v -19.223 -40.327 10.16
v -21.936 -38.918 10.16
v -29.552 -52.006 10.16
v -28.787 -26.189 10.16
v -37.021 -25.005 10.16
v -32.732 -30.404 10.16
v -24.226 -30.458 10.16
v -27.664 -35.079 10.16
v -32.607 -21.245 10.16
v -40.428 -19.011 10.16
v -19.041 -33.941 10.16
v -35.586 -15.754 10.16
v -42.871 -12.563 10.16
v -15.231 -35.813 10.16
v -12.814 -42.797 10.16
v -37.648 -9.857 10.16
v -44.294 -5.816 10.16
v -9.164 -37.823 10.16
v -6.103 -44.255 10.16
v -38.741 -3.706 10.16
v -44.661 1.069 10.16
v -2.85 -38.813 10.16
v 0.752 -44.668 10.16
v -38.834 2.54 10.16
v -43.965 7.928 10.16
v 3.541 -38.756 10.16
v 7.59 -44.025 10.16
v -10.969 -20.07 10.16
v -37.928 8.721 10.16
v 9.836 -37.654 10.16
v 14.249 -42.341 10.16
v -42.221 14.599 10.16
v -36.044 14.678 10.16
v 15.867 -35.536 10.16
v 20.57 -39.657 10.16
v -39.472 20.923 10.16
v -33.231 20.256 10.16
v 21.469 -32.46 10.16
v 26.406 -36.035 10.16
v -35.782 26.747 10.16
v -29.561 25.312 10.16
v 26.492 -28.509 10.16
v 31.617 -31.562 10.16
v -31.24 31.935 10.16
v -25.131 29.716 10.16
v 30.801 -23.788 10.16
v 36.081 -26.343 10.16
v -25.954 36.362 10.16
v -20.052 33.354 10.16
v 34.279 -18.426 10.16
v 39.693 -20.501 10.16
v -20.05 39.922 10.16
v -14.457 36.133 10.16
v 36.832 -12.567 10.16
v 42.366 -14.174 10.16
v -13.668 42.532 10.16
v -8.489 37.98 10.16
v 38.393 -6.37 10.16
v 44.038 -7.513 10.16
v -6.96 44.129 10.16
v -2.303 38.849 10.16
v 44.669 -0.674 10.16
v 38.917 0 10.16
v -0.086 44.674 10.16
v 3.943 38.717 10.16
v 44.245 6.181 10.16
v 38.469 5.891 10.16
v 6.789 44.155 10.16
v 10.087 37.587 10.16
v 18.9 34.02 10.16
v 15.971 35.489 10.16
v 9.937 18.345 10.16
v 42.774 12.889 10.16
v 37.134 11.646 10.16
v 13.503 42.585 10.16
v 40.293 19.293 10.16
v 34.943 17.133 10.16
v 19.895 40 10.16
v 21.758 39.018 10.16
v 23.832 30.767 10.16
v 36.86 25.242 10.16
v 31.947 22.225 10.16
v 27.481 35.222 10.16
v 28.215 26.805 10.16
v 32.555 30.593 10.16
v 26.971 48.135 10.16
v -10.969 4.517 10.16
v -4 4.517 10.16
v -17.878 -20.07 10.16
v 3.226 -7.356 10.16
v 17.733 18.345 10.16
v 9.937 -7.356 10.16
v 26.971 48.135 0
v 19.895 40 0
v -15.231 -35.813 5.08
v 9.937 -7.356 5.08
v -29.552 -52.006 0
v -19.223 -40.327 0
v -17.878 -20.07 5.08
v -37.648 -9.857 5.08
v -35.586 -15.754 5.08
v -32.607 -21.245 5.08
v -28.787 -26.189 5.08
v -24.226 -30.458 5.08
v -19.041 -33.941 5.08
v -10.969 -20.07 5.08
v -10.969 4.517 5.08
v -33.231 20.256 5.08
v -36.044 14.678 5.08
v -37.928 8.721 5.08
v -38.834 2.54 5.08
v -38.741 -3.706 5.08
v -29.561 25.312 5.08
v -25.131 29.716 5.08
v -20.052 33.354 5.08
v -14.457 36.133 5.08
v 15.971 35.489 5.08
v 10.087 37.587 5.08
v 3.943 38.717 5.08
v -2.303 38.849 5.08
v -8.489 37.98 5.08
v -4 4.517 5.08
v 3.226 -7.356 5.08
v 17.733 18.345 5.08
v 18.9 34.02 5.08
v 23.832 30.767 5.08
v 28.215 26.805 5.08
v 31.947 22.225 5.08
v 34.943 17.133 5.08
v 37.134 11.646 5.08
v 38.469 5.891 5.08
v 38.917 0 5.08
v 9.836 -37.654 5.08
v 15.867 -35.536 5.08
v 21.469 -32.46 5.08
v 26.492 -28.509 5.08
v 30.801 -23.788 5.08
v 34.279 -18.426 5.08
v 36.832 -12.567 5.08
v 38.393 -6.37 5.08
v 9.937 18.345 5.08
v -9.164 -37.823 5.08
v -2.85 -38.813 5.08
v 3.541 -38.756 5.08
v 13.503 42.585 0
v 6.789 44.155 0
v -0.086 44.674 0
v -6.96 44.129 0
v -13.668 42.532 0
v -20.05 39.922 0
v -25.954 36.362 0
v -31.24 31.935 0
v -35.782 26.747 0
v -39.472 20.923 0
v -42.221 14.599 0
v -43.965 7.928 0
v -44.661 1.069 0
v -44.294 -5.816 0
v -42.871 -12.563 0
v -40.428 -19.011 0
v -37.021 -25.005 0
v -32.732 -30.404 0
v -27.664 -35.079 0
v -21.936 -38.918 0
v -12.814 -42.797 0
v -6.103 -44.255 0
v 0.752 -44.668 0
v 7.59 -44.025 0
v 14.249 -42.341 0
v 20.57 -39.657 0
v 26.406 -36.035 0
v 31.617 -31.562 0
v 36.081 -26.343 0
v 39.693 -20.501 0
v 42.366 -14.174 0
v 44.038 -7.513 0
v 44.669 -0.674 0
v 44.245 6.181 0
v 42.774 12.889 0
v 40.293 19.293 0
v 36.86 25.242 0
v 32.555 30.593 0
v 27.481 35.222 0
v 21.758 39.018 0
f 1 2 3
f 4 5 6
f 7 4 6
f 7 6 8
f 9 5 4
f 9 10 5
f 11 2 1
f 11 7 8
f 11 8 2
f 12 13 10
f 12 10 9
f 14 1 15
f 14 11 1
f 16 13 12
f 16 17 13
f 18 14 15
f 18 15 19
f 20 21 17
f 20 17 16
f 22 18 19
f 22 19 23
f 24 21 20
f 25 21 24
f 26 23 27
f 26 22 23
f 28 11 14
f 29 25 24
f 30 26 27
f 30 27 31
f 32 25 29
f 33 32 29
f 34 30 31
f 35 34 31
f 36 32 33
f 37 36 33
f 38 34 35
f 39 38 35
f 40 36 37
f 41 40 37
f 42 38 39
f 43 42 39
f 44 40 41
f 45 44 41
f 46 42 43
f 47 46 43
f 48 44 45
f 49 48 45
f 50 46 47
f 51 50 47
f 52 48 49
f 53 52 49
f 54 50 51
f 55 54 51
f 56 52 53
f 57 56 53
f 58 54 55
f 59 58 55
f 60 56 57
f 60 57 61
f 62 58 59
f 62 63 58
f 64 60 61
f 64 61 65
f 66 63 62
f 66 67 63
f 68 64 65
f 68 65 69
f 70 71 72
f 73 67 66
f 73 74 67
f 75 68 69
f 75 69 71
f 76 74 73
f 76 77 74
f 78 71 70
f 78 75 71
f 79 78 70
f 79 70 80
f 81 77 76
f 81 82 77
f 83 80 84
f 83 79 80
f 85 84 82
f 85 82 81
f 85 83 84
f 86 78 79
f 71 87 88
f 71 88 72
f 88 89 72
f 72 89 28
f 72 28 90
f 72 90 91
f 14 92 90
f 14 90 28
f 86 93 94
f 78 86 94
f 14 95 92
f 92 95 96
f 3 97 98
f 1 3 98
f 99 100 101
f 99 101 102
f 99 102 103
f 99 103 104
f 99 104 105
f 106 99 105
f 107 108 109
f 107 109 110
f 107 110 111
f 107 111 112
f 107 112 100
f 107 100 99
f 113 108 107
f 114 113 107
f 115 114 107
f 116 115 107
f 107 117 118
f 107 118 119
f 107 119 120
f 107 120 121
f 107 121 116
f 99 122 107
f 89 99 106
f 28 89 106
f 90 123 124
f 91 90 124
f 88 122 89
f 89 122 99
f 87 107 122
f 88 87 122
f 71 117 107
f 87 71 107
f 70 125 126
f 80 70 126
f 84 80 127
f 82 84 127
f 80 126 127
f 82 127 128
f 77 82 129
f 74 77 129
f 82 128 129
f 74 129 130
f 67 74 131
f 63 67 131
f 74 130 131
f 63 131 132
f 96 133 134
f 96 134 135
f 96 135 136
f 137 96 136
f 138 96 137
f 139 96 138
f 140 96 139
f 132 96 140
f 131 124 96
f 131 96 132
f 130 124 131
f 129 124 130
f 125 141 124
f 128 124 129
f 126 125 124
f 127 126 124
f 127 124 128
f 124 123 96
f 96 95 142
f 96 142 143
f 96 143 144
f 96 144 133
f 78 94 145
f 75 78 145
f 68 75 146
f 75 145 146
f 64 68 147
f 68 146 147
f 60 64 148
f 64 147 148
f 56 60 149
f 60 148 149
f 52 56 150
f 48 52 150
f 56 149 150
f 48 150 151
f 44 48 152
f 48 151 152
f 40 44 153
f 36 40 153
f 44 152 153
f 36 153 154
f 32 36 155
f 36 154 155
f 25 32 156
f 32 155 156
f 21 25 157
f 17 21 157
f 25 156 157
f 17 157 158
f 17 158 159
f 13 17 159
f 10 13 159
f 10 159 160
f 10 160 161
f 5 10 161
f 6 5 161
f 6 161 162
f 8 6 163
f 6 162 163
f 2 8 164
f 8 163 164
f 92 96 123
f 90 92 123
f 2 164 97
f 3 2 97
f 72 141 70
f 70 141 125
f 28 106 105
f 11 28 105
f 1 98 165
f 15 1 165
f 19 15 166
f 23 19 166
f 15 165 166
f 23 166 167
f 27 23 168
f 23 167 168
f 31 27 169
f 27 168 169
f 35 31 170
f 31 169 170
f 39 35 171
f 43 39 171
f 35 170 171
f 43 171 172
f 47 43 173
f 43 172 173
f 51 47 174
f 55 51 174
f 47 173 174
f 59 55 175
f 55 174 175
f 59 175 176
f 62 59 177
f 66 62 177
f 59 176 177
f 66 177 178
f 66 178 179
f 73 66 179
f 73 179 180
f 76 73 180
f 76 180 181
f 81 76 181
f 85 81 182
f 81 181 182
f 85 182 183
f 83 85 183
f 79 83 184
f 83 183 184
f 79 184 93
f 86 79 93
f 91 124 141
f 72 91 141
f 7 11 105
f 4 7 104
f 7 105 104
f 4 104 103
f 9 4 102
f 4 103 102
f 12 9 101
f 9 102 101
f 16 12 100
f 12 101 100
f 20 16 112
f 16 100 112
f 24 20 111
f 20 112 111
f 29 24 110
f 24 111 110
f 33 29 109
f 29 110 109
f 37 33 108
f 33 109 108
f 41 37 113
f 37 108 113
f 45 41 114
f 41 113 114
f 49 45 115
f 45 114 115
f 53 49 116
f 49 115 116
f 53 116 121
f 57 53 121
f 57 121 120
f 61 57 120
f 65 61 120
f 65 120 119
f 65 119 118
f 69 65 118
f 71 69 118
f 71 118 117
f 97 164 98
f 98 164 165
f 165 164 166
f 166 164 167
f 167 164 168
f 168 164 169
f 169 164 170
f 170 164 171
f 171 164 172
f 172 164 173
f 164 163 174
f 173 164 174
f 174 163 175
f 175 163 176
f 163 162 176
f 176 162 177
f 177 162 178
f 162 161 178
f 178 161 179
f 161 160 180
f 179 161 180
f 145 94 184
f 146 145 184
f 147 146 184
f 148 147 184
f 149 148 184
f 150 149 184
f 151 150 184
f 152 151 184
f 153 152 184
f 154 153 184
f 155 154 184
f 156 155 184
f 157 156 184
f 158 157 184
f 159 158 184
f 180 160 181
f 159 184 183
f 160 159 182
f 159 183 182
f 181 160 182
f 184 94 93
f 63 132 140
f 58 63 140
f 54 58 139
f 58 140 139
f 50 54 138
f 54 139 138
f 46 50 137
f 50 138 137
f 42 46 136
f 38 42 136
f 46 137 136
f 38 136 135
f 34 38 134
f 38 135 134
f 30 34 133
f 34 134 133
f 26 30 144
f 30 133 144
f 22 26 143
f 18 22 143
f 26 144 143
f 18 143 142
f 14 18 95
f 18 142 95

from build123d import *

# Parameters (mm, degrees)
F1_DEPTH = 10.16
F2_DEPTH = 5.08


with BuildPart() as f1:
    # F0 (on Top) → F1 (new body)
    with BuildSketch(Plane.XY):
        with BuildLine():
            ThreePointArc((19.8948644209, 39.9997688602), (20.8320918018, 39.5197556971), (21.7577454104, 39.0177863782))
            Line((21.7577454104, 39.0177863782), (26.9711147994, 48.1350496411))
            Line((26.9711147994, 48.1350496411), (19.8948644209, 39.9997688602))
        make_face()
        with BuildLine():
            Line((-29.5520797372, -52.0064979792), (-19.2228405766, -40.327032365))
            ThreePointArc((-19.2228405766, -40.327032365), (-20.5915769431, -39.6456062912), (-21.9361932063, -38.9177410292))
            Line((-21.9361932063, -38.9177410292), (-29.5520797372, -52.0064979792))
        make_face()
        with BuildLine():
            ThreePointArc((-19.2228405766, -40.327032365), (23.8434631573, -37.7793118501), (44.6742335043, 0))
            ThreePointArc((44.6742335043, 0), (38.5214079324, 22.624947958), (21.7577454104, 39.0177863782))
            Line((21.7577454104, 39.0177863782), (18.8999443356, 34.0199965021))
            ThreePointArc((18.8999443356, 34.0199965021), (33.5418077285, 19.7361392424), (38.9174518423, 0))
            ThreePointArc((38.9174518423, 0), (21.4688277759, -32.460090755), (-15.2308770921, -35.8132439315))
            Line((-15.2308770922, -35.8132439315), (-19.2228405766, -40.327032365))
        make_face()
        with BuildLine():
            Line((18.8999443356, 34.0199965021), (21.7577454104, 39.0177863782))
            ThreePointArc((21.7577454104, 39.0177863782), (20.8320918018, 39.5197556971), (19.8948644209, 39.9997688602))
            Line((19.8948644209, 39.9997688602), (15.971442641, 35.4891684583))
            ThreePointArc((15.971442641, 35.4891684583), (17.4511611069, 34.7854140972), (18.8999443356, 34.0199965021))
        make_face()
        with BuildLine():
            ThreePointArc((-21.9361932063, -38.9177410292), (-20.5915769431, -39.6456062912), (-19.2228405766, -40.327032365))
            Line((-19.2228405766, -40.327032365), (-15.2308770922, -35.8132439315))
            ThreePointArc((-15.2308770921, -35.8132439315), (-17.1613070553, -34.9293228971), (-19.0406590573, -33.9414401662))
            Line((-19.0406590573, -33.9414401662), (-21.9361932063, -38.9177410292))
        make_face()
        with BuildLine():
            Line((9.9367275834, 18.344911789), (18.8999443356, 34.0199965021))
            ThreePointArc((18.8999443356, 34.0199965021), (17.4511611069, 34.7854140972), (15.971442641, 35.4891684583))
            Line((15.971442641, 35.4891684583), (-10.9691135585, 4.5166932978))
            Line((-10.9691135585, 4.5166932978), (-4.0004979819, 4.5166932978))
            Line((-4.0004979819, 4.5166932978), (-17.8778032411, -20.0695820685))
            Line((-17.8778032411, -20.0695820685), (-10.9691135585, -20.0695820685))
            Line((-10.9691135585, -20.0695820685), (-19.0406590573, -33.9414401662))
            ThreePointArc((-19.0406590573, -33.9414401662), (-17.1613070553, -34.9293228971), (-15.2308770921, -35.8132439315))
            Line((-15.2308770922, -35.8132439315), (9.9367275834, -7.3557584547))
            Line((9.9367275834, -7.3557584547), (3.2262078021, -7.3557584547))
            Line((3.2262078021, -7.3557584547), (17.7325143094, 18.344911789))
            Line((17.7325143094, 18.344911789), (9.9367275834, 18.344911789))
        make_face()
        with BuildLine():
            Line((15.971442641, 35.4891684583), (19.8948644209, 39.9997688602))
            ThreePointArc((19.8948644209, 39.9997688602), (-39.4719533034, 20.9225247427), (-21.9361932063, -38.9177410292))
            Line((-21.9361932063, -38.9177410292), (-19.0406590573, -33.9414401662))
            ThreePointArc((-19.0406590573, -33.9414401662), (-34.7492068376, 17.5231470361), (15.971442641, 35.4891684583))
        make_face()
    extrude(amount=F1_DEPTH)

    # F0 (on Top) → F2 (join)
    with BuildSketch(Plane.XY):
        with BuildLine():
            Line((-10.9691135585, 4.5166932978), (15.971442641, 35.4891684583))
            ThreePointArc((15.971442641, 35.4891684583), (-34.7492068376, 17.5231470361), (-19.0406590573, -33.9414401662))
            Line((-19.0406590573, -33.9414401662), (-10.9691135585, -20.0695820685))
            Line((-10.9691135585, -20.0695820685), (-17.8778032411, -20.0695820685))
            Line((-17.8778032411, -20.0695820685), (-4.0004979819, 4.5166932978))
            Line((-4.0004979819, 4.5166932978), (-10.9691135585, 4.5166932978))
        make_face()
        with BuildLine():
            ThreePointArc((38.9174518423, 0), (33.5418077285, 19.7361392424), (18.8999443356, 34.0199965021))
            Line((18.8999443356, 34.0199965021), (9.9367275834, 18.344911789))
            Line((9.9367275834, 18.344911789), (17.7325143094, 18.344911789))
            Line((17.7325143094, 18.344911789), (3.2262078021, -7.3557584547))
            Line((3.2262078021, -7.3557584547), (9.9367275834, -7.3557584547))
            Line((9.9367275834, -7.3557584547), (-15.2308770922, -35.8132439315))
            ThreePointArc((-15.2308770921, -35.8132439315), (21.4688277759, -32.460090755), (38.9174518423, 0))
        make_face()
    extrude(amount=F2_DEPTH)


solid = f1.part
